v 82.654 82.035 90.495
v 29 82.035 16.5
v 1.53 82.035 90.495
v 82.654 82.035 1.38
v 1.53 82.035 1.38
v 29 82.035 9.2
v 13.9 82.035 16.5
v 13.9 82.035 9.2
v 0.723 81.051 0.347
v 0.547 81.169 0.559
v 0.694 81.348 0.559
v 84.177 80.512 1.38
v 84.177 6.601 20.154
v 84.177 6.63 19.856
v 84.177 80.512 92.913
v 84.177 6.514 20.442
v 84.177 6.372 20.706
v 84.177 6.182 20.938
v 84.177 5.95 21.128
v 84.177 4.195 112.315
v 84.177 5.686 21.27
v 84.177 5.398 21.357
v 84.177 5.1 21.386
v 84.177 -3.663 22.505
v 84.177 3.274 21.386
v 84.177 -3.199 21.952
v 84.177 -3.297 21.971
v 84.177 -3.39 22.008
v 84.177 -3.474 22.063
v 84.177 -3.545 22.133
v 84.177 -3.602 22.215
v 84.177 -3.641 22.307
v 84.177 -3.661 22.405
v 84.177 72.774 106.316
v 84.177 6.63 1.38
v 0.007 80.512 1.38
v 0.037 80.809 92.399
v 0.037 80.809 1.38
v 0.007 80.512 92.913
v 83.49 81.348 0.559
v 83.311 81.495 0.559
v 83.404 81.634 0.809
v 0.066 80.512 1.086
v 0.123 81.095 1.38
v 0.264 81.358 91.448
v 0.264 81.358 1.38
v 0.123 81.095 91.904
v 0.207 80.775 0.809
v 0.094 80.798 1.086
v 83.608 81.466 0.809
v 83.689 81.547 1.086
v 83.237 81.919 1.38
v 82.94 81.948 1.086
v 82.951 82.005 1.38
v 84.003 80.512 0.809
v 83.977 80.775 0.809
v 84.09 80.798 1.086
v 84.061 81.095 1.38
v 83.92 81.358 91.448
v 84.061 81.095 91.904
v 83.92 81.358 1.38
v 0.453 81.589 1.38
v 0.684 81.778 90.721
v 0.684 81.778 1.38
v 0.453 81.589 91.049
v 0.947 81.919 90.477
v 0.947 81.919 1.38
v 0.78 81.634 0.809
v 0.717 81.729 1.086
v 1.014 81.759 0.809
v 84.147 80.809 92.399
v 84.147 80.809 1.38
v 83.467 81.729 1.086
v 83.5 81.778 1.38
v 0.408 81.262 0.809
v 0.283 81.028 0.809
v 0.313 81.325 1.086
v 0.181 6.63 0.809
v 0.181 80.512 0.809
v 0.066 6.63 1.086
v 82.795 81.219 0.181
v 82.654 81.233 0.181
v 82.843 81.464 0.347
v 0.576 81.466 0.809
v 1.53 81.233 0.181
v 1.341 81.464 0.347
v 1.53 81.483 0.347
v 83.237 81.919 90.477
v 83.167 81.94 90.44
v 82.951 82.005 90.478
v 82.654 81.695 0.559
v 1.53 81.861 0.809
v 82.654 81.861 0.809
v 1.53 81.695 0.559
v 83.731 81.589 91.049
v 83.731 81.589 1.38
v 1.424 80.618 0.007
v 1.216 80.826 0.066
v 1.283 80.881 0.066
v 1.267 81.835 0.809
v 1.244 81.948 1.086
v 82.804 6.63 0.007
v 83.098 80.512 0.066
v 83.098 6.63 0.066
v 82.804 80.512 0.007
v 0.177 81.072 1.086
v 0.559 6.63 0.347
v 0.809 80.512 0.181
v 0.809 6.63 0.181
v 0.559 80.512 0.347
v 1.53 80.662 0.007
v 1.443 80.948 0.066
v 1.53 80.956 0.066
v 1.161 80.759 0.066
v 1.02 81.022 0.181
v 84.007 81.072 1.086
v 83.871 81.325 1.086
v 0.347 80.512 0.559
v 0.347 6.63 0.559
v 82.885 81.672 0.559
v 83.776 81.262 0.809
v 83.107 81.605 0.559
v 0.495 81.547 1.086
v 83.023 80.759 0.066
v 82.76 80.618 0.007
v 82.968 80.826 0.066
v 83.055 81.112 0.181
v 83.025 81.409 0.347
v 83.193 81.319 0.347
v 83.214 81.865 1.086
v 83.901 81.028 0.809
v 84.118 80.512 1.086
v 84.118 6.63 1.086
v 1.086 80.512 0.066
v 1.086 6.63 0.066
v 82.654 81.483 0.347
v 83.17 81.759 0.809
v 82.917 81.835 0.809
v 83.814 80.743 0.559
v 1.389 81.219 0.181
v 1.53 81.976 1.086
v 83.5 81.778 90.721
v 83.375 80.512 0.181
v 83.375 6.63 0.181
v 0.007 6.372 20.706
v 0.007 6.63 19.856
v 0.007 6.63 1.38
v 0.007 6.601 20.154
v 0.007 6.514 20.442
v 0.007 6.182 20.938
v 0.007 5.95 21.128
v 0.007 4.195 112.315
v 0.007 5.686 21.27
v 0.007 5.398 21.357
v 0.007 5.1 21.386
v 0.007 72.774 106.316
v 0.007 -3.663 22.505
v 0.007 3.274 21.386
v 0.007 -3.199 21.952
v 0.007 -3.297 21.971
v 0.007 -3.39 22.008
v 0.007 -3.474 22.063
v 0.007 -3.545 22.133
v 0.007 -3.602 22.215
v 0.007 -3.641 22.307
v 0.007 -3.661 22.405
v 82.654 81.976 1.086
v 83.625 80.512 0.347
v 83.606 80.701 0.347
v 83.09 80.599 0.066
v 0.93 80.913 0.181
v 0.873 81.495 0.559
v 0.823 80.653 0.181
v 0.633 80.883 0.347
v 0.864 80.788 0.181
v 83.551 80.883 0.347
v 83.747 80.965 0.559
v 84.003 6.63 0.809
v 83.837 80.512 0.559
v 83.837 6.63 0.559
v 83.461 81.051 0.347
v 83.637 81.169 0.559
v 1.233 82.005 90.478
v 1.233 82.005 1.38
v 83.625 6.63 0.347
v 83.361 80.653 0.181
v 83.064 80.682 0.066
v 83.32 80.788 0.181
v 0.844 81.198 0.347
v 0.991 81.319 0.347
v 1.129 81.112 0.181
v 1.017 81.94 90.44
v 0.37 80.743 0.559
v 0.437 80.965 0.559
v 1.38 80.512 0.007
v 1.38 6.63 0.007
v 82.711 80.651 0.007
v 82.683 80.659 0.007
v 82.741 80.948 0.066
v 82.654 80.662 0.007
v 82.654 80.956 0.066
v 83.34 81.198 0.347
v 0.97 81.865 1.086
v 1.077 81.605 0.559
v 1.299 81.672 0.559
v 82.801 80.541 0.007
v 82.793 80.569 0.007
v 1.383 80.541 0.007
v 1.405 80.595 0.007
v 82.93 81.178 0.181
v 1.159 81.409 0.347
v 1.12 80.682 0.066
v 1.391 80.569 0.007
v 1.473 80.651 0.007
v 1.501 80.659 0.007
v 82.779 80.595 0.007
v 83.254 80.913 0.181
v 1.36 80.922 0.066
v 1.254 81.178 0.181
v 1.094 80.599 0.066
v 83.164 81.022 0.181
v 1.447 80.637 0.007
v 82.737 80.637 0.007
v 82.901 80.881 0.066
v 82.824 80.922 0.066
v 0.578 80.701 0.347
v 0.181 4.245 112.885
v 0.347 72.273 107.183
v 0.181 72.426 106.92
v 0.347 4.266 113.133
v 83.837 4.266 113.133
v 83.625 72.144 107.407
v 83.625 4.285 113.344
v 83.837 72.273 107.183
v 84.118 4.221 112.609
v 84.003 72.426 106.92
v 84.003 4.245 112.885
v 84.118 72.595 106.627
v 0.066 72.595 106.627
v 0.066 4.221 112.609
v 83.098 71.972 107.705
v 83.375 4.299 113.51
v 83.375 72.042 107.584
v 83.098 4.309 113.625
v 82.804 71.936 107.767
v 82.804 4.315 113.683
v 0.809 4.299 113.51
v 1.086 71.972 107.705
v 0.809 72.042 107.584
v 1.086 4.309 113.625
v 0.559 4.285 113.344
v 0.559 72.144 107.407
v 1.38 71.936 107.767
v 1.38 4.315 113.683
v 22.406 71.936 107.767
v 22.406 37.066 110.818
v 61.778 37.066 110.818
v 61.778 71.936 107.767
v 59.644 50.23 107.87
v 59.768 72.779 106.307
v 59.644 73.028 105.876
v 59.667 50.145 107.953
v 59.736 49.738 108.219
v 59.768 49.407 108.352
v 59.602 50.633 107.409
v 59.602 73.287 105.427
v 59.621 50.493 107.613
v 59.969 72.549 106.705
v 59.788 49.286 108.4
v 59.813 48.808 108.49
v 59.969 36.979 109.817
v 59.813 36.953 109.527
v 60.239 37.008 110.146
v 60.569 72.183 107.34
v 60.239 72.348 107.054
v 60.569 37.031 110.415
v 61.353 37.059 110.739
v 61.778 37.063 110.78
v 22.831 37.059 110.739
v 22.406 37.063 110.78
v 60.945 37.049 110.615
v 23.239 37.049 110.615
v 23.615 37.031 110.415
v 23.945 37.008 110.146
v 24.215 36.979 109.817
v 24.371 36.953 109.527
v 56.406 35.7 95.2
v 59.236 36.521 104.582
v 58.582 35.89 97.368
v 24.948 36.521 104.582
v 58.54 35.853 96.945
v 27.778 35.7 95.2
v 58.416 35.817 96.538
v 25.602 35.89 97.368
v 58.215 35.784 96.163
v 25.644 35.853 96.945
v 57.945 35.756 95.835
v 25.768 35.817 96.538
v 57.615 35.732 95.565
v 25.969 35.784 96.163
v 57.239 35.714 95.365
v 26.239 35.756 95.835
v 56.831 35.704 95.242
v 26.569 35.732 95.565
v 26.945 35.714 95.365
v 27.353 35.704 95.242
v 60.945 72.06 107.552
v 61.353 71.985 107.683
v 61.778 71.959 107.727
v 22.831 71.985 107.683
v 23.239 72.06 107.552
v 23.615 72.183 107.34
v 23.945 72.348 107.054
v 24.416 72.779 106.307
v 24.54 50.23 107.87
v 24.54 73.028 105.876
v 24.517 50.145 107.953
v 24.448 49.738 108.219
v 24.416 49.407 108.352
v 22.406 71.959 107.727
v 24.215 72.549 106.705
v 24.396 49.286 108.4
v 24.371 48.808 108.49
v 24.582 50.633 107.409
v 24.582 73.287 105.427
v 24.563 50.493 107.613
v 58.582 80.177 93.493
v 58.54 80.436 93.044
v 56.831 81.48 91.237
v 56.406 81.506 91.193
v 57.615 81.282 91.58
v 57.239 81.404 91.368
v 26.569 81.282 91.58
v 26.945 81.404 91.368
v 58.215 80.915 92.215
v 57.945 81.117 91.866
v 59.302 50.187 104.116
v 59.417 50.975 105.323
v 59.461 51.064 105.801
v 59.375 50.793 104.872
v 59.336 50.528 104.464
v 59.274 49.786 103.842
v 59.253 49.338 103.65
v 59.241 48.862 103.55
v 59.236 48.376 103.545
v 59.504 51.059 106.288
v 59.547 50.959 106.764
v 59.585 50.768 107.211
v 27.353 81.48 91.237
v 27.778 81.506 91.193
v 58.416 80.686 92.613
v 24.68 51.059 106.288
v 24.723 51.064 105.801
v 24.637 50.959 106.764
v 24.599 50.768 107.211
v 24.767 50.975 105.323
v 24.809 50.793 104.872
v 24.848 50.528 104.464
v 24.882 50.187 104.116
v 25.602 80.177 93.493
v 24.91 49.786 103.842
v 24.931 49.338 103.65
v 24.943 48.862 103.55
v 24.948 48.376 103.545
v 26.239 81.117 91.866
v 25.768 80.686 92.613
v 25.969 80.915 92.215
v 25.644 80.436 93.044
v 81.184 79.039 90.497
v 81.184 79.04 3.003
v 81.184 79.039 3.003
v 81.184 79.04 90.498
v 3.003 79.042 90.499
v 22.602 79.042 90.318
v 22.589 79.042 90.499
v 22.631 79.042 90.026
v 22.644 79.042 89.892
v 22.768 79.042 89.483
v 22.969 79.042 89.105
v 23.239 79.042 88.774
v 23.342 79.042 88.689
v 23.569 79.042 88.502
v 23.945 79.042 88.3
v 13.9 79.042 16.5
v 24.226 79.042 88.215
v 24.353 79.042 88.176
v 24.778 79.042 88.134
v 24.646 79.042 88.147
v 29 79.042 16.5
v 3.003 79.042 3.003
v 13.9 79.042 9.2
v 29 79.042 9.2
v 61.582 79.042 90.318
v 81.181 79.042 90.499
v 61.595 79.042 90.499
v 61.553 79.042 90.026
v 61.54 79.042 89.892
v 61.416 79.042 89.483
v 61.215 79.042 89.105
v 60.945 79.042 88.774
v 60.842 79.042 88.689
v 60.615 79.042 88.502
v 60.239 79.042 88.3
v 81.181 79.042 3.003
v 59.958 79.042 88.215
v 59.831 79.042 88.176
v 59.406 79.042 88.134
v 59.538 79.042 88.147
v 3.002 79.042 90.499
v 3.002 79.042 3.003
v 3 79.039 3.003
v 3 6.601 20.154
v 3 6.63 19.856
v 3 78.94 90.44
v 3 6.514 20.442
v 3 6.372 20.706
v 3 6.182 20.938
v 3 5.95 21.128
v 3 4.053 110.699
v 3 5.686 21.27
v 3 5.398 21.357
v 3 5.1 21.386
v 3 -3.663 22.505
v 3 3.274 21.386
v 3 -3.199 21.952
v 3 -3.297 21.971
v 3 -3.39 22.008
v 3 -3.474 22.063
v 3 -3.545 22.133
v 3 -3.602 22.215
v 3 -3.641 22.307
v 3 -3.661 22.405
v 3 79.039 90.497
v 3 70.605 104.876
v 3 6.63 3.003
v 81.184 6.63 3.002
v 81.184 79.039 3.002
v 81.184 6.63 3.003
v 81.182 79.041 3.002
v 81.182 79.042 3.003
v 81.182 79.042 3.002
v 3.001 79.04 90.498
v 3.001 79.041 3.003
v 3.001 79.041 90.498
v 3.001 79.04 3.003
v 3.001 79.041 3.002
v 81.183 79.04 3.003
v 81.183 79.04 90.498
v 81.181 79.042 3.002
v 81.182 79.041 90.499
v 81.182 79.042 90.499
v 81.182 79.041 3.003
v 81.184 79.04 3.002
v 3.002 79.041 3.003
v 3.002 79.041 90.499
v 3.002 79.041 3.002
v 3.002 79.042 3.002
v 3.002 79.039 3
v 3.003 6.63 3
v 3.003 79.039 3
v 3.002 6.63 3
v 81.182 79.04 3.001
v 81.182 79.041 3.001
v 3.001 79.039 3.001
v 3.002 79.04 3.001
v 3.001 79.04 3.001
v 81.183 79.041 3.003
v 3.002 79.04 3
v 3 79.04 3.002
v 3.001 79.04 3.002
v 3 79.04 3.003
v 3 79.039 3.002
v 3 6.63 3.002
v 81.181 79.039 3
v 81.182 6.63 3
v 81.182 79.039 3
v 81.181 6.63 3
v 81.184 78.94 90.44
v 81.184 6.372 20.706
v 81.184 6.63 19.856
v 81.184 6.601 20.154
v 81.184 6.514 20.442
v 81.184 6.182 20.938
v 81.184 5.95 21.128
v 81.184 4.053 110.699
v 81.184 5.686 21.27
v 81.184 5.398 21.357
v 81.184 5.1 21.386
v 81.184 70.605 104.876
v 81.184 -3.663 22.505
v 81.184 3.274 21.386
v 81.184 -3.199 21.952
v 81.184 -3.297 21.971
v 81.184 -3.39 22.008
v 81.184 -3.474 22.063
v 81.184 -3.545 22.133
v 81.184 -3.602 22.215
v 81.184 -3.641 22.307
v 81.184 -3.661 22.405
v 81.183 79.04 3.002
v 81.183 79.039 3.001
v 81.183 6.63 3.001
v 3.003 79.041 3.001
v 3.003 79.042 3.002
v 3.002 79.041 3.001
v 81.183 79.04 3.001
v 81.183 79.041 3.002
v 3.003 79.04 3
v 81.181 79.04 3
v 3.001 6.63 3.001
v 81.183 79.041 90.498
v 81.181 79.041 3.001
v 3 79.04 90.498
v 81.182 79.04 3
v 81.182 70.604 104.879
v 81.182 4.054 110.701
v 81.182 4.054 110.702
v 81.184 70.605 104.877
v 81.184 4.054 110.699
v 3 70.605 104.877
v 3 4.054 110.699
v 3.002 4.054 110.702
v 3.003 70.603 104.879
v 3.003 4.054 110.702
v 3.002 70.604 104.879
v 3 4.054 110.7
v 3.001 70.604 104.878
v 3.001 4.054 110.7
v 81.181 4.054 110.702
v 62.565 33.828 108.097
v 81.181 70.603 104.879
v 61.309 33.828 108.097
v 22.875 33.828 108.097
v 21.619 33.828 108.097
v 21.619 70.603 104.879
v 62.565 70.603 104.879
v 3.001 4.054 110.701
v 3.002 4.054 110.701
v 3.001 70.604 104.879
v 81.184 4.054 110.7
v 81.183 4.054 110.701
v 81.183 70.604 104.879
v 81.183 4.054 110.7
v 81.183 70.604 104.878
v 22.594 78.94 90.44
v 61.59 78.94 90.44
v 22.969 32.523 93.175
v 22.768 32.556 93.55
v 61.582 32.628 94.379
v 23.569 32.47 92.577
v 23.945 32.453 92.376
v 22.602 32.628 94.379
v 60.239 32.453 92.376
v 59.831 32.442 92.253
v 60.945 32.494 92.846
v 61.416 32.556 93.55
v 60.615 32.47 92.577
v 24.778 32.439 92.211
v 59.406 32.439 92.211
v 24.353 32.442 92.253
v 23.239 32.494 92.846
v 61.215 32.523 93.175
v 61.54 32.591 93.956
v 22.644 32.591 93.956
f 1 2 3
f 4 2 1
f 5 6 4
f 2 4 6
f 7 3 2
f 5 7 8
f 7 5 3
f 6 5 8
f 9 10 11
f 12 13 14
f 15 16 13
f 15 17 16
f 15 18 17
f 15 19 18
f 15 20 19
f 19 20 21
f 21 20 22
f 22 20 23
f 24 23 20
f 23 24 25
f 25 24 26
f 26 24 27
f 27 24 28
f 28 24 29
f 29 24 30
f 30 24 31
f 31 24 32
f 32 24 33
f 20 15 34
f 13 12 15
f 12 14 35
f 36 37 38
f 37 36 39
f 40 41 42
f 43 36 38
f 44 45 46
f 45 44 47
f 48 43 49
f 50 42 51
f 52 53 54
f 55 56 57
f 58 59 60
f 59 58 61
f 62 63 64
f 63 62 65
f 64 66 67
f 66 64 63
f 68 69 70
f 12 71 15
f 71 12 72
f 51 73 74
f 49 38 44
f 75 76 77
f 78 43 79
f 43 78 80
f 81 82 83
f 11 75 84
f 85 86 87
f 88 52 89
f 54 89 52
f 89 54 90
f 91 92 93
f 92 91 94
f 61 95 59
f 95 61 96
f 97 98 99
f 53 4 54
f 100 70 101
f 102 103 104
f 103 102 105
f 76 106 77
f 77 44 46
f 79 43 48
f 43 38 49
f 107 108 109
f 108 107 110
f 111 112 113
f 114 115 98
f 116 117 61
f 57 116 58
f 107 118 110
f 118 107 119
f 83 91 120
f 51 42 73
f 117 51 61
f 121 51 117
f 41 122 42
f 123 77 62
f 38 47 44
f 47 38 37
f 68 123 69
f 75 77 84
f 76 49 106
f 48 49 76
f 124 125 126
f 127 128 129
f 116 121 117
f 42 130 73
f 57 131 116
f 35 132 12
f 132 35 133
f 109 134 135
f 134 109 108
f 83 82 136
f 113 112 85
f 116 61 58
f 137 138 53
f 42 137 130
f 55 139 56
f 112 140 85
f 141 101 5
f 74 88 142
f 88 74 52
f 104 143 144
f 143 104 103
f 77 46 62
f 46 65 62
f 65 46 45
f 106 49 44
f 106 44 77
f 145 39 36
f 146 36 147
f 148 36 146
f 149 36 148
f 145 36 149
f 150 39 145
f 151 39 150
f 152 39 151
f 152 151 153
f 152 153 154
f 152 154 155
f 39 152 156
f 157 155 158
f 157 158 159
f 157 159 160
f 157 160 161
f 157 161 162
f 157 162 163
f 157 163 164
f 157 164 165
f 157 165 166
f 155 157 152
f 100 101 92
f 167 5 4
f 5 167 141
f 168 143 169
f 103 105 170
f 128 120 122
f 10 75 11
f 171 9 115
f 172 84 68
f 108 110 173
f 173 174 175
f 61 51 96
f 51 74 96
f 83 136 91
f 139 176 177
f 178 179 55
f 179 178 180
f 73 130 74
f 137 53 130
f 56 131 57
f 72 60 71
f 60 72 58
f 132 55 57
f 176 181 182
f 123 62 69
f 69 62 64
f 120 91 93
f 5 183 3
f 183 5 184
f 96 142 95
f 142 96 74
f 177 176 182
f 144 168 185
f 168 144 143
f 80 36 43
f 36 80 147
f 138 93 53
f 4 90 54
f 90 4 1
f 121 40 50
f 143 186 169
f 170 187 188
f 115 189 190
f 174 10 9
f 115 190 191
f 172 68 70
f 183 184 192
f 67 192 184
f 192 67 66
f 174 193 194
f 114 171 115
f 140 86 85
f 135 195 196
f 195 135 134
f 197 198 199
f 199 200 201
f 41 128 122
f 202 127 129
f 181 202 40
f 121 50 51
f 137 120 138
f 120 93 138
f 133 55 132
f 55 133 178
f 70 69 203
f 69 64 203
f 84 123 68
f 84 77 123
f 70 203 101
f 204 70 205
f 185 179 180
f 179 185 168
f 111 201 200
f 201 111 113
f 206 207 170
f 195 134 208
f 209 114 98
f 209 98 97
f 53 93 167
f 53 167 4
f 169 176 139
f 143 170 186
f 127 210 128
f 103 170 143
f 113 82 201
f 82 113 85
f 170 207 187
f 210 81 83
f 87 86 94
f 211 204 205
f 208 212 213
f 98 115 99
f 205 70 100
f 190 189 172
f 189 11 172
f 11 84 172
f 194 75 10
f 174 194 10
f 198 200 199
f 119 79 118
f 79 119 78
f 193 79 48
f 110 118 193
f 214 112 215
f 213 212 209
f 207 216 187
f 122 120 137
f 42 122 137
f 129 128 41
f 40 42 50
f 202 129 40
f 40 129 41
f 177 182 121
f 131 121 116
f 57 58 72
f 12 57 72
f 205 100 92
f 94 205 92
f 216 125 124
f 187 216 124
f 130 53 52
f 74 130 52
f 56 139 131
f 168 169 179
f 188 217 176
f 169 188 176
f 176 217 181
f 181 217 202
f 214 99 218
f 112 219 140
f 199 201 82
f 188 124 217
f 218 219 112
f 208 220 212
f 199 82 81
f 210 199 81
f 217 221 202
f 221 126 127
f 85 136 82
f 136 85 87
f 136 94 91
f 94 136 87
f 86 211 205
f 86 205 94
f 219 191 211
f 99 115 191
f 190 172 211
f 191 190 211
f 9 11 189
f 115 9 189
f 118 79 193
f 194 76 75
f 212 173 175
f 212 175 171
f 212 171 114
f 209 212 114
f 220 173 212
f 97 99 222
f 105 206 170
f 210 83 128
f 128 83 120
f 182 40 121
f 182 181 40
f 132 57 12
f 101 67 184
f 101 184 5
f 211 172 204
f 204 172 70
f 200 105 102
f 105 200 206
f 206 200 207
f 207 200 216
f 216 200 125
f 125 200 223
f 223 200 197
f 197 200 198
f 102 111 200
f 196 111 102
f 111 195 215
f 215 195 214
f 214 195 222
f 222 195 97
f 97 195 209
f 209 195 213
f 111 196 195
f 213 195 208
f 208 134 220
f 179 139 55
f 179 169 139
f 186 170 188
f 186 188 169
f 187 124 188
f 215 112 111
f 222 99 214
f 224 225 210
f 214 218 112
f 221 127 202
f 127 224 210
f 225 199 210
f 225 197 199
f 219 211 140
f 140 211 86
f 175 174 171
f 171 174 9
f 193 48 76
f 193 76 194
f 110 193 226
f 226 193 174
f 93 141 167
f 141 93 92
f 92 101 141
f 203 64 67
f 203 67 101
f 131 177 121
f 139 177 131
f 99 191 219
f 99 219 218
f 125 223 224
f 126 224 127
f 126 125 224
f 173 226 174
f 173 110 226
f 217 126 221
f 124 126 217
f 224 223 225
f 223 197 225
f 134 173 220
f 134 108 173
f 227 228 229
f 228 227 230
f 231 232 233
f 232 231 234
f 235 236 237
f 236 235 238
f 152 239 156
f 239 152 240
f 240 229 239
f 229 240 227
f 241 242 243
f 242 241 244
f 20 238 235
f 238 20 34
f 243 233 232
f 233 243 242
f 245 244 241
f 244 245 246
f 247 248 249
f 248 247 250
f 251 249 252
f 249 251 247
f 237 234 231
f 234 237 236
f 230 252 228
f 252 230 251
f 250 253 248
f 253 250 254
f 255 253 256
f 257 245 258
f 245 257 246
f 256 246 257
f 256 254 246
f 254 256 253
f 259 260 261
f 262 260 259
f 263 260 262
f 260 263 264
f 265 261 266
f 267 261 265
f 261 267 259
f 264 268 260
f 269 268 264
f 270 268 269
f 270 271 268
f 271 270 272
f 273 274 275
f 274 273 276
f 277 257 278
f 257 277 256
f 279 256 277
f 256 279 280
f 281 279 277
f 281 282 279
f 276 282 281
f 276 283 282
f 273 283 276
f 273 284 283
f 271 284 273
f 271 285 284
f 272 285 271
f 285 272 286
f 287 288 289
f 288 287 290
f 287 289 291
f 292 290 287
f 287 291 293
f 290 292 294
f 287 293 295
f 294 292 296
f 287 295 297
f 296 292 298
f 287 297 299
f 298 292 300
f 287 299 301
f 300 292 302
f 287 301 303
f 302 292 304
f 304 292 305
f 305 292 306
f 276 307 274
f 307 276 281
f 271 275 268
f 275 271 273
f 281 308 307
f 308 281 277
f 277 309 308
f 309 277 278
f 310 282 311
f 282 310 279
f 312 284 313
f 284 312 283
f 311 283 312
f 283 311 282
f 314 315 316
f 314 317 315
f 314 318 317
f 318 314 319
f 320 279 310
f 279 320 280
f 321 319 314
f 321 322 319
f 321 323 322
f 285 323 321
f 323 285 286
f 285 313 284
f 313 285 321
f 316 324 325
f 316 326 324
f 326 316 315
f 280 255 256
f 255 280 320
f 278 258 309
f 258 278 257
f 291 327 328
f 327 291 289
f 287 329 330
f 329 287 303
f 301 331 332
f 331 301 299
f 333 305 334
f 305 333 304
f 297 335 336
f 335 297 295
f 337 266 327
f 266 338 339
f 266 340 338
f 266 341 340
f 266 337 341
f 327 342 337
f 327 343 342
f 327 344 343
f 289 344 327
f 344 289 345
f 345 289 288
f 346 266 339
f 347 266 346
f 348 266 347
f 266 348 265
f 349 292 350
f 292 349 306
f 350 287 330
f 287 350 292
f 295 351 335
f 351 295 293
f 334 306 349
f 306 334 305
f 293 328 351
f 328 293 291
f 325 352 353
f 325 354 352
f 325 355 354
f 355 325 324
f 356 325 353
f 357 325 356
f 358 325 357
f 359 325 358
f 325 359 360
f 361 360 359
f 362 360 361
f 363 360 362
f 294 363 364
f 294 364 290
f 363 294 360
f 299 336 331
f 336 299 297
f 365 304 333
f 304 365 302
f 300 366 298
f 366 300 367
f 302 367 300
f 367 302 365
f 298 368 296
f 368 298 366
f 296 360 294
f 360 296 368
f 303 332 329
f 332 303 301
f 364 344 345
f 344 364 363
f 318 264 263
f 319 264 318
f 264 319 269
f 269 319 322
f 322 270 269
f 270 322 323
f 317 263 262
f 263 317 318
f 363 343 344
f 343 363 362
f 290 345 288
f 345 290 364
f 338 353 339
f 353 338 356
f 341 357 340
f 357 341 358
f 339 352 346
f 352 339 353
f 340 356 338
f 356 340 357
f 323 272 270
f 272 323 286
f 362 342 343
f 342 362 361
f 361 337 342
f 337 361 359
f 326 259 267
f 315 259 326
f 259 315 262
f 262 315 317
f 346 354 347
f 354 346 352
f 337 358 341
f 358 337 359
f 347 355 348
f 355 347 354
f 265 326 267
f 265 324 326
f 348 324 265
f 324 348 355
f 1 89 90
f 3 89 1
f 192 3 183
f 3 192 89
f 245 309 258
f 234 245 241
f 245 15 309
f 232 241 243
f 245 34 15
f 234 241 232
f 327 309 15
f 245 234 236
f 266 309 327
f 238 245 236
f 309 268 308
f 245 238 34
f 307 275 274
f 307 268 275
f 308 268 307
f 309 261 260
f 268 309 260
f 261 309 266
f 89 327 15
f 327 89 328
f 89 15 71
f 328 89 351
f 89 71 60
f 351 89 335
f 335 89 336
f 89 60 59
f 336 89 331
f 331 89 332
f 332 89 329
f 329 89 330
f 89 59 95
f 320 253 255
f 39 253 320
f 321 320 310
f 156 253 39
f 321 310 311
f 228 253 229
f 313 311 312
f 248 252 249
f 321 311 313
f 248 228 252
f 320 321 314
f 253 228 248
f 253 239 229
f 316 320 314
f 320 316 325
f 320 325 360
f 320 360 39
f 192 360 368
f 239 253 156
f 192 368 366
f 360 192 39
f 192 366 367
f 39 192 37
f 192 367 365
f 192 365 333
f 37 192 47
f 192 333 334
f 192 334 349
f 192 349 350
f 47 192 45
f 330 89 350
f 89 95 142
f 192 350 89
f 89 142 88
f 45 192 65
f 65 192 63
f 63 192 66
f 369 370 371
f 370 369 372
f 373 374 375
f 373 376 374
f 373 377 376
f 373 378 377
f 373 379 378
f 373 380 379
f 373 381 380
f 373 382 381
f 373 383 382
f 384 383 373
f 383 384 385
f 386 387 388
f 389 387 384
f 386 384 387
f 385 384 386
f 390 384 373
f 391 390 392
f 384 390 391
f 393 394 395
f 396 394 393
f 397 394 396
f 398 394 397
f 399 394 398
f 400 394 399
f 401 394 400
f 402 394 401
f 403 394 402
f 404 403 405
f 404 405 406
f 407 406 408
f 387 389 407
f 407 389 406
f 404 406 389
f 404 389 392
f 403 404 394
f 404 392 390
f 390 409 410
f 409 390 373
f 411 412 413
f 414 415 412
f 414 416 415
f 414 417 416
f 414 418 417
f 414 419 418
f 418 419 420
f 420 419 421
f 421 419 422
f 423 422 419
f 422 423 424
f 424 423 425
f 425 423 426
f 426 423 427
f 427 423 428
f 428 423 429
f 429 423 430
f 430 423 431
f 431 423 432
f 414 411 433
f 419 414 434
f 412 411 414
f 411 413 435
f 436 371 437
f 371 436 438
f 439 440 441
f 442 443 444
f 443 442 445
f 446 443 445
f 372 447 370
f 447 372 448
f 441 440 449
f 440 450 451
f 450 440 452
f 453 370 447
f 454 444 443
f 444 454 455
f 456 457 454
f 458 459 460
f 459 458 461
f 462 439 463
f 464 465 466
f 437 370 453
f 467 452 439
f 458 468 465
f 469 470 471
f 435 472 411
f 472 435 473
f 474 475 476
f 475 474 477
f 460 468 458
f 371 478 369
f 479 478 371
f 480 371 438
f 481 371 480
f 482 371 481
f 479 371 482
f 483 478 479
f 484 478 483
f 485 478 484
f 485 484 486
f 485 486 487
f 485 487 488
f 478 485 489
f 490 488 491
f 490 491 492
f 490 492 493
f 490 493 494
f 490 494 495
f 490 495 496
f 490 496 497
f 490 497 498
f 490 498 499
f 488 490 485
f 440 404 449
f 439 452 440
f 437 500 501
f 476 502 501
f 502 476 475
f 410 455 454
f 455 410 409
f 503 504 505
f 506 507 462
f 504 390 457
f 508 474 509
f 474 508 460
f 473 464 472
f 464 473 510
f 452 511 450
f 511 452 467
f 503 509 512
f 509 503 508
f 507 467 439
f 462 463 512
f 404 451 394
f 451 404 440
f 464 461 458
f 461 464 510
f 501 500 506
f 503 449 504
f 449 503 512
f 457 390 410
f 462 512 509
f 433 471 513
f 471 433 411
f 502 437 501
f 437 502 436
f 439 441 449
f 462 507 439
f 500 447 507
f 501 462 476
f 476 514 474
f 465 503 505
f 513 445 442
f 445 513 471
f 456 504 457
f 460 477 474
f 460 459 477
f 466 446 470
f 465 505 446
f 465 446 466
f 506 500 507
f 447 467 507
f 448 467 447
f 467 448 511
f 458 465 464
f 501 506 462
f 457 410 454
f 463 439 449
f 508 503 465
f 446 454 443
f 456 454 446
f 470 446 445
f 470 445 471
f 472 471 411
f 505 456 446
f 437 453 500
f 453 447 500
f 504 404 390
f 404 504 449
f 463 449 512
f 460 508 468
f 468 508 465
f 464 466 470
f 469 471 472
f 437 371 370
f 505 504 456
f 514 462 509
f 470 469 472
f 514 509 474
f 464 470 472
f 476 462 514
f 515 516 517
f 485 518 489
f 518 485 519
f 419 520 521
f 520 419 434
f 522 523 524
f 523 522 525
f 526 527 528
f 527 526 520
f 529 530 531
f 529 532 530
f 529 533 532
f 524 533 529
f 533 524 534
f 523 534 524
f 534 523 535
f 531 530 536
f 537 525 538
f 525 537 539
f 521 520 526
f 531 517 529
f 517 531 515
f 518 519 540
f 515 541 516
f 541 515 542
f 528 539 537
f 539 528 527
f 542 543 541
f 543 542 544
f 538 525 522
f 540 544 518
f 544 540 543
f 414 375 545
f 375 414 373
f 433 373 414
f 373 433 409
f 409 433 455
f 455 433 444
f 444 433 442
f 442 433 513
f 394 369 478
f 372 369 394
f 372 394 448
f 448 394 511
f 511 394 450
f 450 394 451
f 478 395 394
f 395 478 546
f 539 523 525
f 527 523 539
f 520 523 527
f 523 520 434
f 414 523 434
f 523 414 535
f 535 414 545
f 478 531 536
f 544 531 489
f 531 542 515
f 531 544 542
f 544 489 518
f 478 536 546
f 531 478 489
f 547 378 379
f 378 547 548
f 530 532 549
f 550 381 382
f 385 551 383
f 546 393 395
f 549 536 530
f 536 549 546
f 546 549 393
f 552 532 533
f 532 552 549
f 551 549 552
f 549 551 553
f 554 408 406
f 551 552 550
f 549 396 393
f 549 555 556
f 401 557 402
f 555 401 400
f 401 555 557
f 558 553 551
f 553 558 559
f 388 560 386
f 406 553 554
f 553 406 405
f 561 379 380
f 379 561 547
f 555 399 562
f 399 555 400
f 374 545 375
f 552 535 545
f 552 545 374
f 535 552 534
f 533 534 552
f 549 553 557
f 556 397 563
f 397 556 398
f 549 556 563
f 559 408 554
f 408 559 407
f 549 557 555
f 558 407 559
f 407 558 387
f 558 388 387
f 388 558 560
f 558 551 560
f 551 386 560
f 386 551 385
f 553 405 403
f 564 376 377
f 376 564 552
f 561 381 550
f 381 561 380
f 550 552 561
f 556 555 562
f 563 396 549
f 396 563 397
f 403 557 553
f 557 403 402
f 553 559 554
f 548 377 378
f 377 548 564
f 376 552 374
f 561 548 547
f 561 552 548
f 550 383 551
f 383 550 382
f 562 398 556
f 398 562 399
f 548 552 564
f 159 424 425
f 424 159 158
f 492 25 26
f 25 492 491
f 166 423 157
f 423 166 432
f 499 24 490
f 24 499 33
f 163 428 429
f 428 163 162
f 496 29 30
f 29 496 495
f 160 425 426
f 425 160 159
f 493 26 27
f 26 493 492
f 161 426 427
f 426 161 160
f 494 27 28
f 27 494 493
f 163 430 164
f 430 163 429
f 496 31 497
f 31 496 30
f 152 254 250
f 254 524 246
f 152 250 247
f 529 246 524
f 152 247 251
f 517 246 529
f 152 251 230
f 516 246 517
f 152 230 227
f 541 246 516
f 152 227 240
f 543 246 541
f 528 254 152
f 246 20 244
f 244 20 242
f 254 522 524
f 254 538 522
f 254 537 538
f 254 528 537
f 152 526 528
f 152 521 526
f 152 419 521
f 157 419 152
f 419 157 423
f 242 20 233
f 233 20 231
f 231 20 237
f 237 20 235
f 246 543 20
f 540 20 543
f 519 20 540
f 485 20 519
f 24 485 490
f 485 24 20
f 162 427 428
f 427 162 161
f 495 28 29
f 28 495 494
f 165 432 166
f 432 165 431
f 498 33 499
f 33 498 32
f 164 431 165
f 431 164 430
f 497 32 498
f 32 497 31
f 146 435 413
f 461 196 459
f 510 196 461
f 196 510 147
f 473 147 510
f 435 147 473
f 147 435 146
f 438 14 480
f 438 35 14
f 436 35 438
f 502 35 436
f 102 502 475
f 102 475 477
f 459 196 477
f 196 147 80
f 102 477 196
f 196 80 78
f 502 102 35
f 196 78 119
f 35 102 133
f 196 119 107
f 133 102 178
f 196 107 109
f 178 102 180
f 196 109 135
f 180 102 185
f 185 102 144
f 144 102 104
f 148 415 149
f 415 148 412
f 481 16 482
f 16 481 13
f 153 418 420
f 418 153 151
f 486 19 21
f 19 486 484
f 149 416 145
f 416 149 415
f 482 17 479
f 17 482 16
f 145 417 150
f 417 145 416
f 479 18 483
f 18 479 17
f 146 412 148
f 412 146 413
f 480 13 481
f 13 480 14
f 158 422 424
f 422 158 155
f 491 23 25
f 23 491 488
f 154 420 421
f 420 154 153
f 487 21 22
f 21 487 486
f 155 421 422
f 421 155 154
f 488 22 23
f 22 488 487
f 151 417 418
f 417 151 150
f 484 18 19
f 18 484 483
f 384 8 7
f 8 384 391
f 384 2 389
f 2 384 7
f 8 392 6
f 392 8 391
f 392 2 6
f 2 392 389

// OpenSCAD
/*
 * ----------------------------------------------------------------------------
 * "THE BEER-WARE LICENSE" (Revision 42):
 * Jeroen Domburg <jeroen@spritesmods.com> wrote this file. As long as you retain 
 * this notice you can do whatever you want with this stuff. If we meet some day, 
 * and you think this stuff is worth it, you can buy me a beer in return. 
 * ----------------------------------------------------------------------------
 */

//All measurements in mm

$fa=8; //segments/360 degrees
$fs=0.1; //min size of fragment
$fn=32; //override amount of facets


scale=102/300; //1-to-6

wall=3; //real mms

overlap=5; //real mms; overlap between halves 
overlapth=1.5; //real mms: thickness of material in overlap

//1 - cutout
//2 - full render
//3 - intersection case - pcb
//4 - front half / back half
//5 - front half / back half side-by-side
//6 - back
//7 - front
type=6;

// waveshare display
/*translate([4, 5, 52])
difference() {
    cube([71.5, 11.1, 53]);
    translate([8.65, 0, 4.65])
        cube([58, 11.1, 43.6]); 
}*/

if (type==1) {
    difference() {
        union() {
            mac_half_front(wall, scale, overlap, overlapth);
            translate([0,1,0]) mac_half_back(wall, scale, overlap, overlapth);
        }
        translate([125*scale, -500, -500]) cube([1000, 1000, 1000], false);
    }
    displaypcb(wall, scale);
    translate([0,1,0]) usbserpcb_mounted(wall);
} else if (type==2) {
    union() {
        mac_half_front(wall, scale, overlap, overlapth);
        mac_half_back(wall, scale, overlap, overlapth);
    }
    displaypcb(wall, scale);
    usbserpcb_mounted(wall);
} else if (type==3) {
    intersection() {
        union() {
            mac_half_front(wall, scale, overlap, overlapth);
            mac_half_back(wall, scale, overlap, overlapth);
        }
        displaypcb(wall, scale);
    }
} else if (type==4 || type==5) {
    translate([0, 10, 0]) union() {
        mac_half_back(wall, scale, overlap, overlapth);
        usbserpcb_mounted(wall);
    }
    rotate([0,0,type==5?180:0]) union () {
        mac_half_front(wall, scale, overlap, overlapth);
        *color("red") displaypcb(wall, scale);
    }
} else if (type==6) {
    mac_half_back(wall, scale, overlap, overlapth);
} else if (type==7) {
    mac_half_front(wall, scale, overlap, overlapth);
}


module mac_half_front(wall, scale, overlap, overlapth) {
    difference() {
    union() {
        scale(scale) union() {
            difference() {
                mac_hull(wall/scale);
                mac_crack_divider();
            }
            intersection() {
                mac_overlap_inner_edge(overlapth/scale);
                difference() {
                    //mac_crack_divider_expanded(-0.8/scale);
                    //mac_crack_divider_expanded(overlap/scale);
                }
            }
        }
        difference() {
            union() {
                //bottom screen tab
                //translate([17+wall, -1, 8]) rotate([-20, 0, 0]) cube([10, 2, 3]);
                //top tab
                //translate([14.5+wall, 1, 50]) cube([4, 5, 3]);
            }
            displaypcb(wall, scale);
            
            
        } 
        
       
    }
    
    
    // apple logo
            translate([10, -7.5, 39])
                rotate([85, 0, 0])   
                    scale([0.02, 0.02 , 1])
                        linear_extrude(1.0) 
                            import("applelogo.svg"); 
   }
}


module mac_half_back(wall, scale, overlap, overlapth) {
    union() {
    difference() {
        union() {
            scale(scale) difference() {
                intersection() {
                    mac_hull(wall/scale);
                    mac_crack_divider();
                }
                intersection() {
                    mac_overlap_inner_edge(overlapth/scale);
                    difference() {
                        //mac_crack_divider();
                        //mac_crack_divider_expanded(overlap/scale);
                    }
                }
            }
            //front tab for usb-ser conv
            //translate([wall, 37.7-26-2, 0]) cube([16, 2, wall+1.7]);
            //back tabs for usb-ser conv
            //translate([0, 37-5, wall+1.9]) cube([16+wall, 7, 3]); 
        }
        scale([2, 1, 2])
            usb_hole(wall);
        //mouse_hole(wall);
        //usbserpcb_mounted(wall);        
    }
    //Enable for signatures in backplate
    //Disabled because 3d-printer doesn't really show these...
    //translate([wall, 38.2, 8+wall]) rotate([90, 0, 0]) scale(.2) linear_extrude(height = 3.3) import(file = "signatures.dxf");

    }
}

module usb_hole(wall) {
    w=3; //extra width for bevel
    i=0.2; //inset of bevel
    translate([16+wall,37.7,wall])  rotate([0,0,180]) union() {
        translate([4.5, -100, 1.6]) cube([7.55, 100 , 3.65]);
        translate([4.5-w/2, -wall+i-10, 1.6-w/2]) cube([7.55+w, 10 , 3.65+w]);
    }
}

module mouse_hole(wall) {
    translate([26+wall, 37.7, wall+3.2]) rotate([-90, 0, 0]) cylinder(d=2, 50);
}

module usbserpcb_mounted(wall) {
    translate([16+wall,37.7,wall]) rotate([0,0,180]) usbserpcb();
}

module usbserpcb() {
    cube([16, 26, 1.6]);
    translate([4.5, 0, 1.6]) cube([7.55, 9 , 3.65]);
}



//generates square hull you can cut the inner overlap out of
module mac_overlap_inner_edge(overlapth, isInner) {
    difference() {
        translate([overlapth, -200, overlapth]) cube([247.6-overlapth*2,500,334-overlapth*2]);
        translate([overlapth*2, -200, overlapth*2]) cube([247.6-overlapth*4,500,334-overlapth*4]);
    }
    
}


module mac_hull(wall) {
    difference() {
        mac_hull_solid(0);
        union() {
            mac_hull_solid(wall);
             translate([0, -25.4, 44.5]) rotate([-5,0, 0]) union() {            //Cutout the screen in the back of the frontplate as well
                translate([247.6/2, 0, 185]) rotate([90, 0, 0]) scale(1.55) mac_screen_cutout(wall/1.69);
                //Cutout fdd slot
                translate([129, -5.2, 62.8]) rotate([90,0,0]) fdd_cutout();
             }
        }
    }
}




module displaypcb(wall, scale) {
    translate([wall+.6,-1.6,60*scale]) rotate([90-5,180,180]) translate([0, -42, wall-2.05]) union() {
        cube([35,42, 0.8]); //main pcb
        translate([1, 6.8, 0]) cube([16, 24, 3.6+0.8]); //wroom block
        translate([1.6, 0.4, -1.2]) difference() { //screen
            cube([32.2, 36.75, 1.2]);
            translate([1.5, 2.73, -10+0.7]) cube([28.9, 19.5, 10]);
        }
    }
}



module mac_hull_solid(shrink) {
    rnd=4.5; //rounding of outer case
    //ir=0.8; //rounding of outmost screen bezel
    //a=-6.18; //angle of front
    r=(rnd<shrink)?0.01:rnd-shrink;
    difference() {
        union() {
            difference() {
                //Cube that makes up bottom and back of mac
                translate([shrink, shrink, shrink]) roundedcube(247.6-shrink*2, 241.3-shrink*2, 310-shrink*2, r);
                //cut off bit that sticks through front panel           
                translate([-500, -1000+150, 150]) cube([1000, 1000, 1000]);
            }
            //add in rotated front bulk
            translate([0, -25.4, 44.5]) rotate([-5,0, 0]) mac_front_bulk(4.5, 2, shrink);
        }
        union() {
            //Cut off diagonal bit in top-back of case
            translate([-1, 241-shrink, 266]) rotate([30, 0, 0]) cube([300, 300, 300], false);
            //Handle handle
            translate([247.6/2,105-shrink,280]) rotate([90+5,0,180]) mac_handle_hole(shrink);
        }
    }
}

module mac_front_bulk(or, ir, shrink) {
    fp_th=5.2; //thickness of front plate)
    fp_extra=(shrink<fp_th)?0:shrink-fp_th;
    or=(or<shrink)?0.01:or-shrink;
    ir=(ir<shrink)?0.01:ir-shrink;
    difference() {
        union() {
            difference() {
                translate([0+shrink, -20+shrink, 0+shrink]) roundedcube(247.6-shrink*2, 233.9+20-shrink*2, 292.1-shrink*2, or);
                union() {
                    //Cut off front where faceplate goes
                    translate([-500, -1000+fp_extra, -500]) cube([1000, 1000, 1000]);
                }
            }
            if (shrink==0) {
                mac_front_faceplate(or, ir);
            } else {
                translate([247.6/2, 50, 185])  rotate([90,0,0])scale([1.69, 1.69, 100]) scale(0.95) mac_screen_cutout_back();
                
            }
        }
    }
}



//negative: handle hole (as in: hole for the handle to carry the mac)
//needs to be bigger when shrink increases
module mac_handle_hole(shrink) {
    r=6.4;
    difference() {
        union() {
            hull() {
                translate([-97/2+r-shrink, r-shrink ,0]) cylinder(r=r, 200);
                translate([97/2-r+shrink, r-shrink ,0]) cylinder(r=r, 200);
                translate([-103/2+r-shrink, 46-r ,0]) cylinder(r=r, 200);
                translate([103/2-r+shrink, 46-r ,0]) cylinder(r=r, 200);
            }
            if (shrink==0) {
                difference() {
                    translate([-103/2-r, 46-r, 0]) cube([103+2*r, 200, 200]);
                    union() {
                        translate([-103/2-r, 46-r ,0]) cylinder(r=r, 200);
                        translate([103/2+r, 46-r ,0]) cylinder(r=r, 2200);                
                    }
                }
            }
        }
        if (shrink==0) {
            //thing where you hold the mac
            translate([-100, 35, 0]) rotate([90,0,90]) hull() {
                cylinder(d=14.6, 200);
                translate([0, 35, 0]) cylinder(d=14.6, 200);            
            }
        }
    }
}

//crack divider, but moved up/right to get the overlap edge
module mac_crack_divider_expanded(ex) {
    translate([0,ex,ex]) mac_crack_divider();
}

module mac_crack_divider() {
    difference() {
        rotate([-5, 0, 0]) translate([0, -15, 65]) union() {
            hull () {
                translate([0,0,0]) rotate([0,90,0]) cylinder(r=1.5, 1000);
                translate([0,0,1000]) rotate([0,90,0]) cylinder(r=1.5, 1000);
                translate([0,1000,0]) rotate([0,90,0]) cylinder(r=1.5, 1000);
            }
            translate([-500,20,-500]) cube([1000,1000,1000]);            
        }
        translate([0, 15, 0]) hull() {
            translate([-500, 0, -200]) rotate([0,90,0]) cylinder(r=4.5, 1000);
            translate([-500, 0, 58.4]) rotate([0,90,0]) cylinder(r=4.5, 1000);            
            translate([-500, -200, 58.4]) rotate([0,90,0]) cylinder(r=4.5, 1000);            
        }
    }
}


module mac_front_faceplate() {
    mac_front_faceplate_outer(4.5, 2);
}

module mac_front_faceplate_outer(or, ir) {
    hull() {
        //connection to bulk of case
        translate([0+or, 0, 0+or]) rotate([90,0,0]) cylinder(1, or);
        translate([0+or, 0, 292.1-or]) rotate([90,0,0]) cylinder(1, or);
        translate([247.6-or, 0, 0+or]) rotate([90,0,0]) cylinder(1, or);
        translate([247.6-or, 0, 292.1-or]) rotate([90,0,0]) cylinder(1, or);
        //face of mac
        translate([0+3.4+ir, 1-5.2, 0+8+ir]) rotate([90,0,0]) cylinder(1, ir);
        translate([0+3.4+ir, 1-5.2, 292.1-10-ir]) rotate([90,0,0]) cylinder(1, ir);
        translate([247.6-3.4-ir, 1-5.2, 0+8+ir]) rotate([90,0,0]) cylinder(1, ir);
        translate([247.6-3.4-ir, 1-5.2, 292.1-10-ir]) rotate([90,0,0]) cylinder(1, ir);
    }
}


//WARNING: Everything inhere is adjusted using the wrong scale because I didn't pay attention. I'm too lazy to fix it all up, so if you use it scale(1.69) it first.
module mac_screen_cutout(depth) {
    
    or=2.5;
    ow=123-or*2;
    oh=94-or*2;
    
    hull() {
        //back cutout; fakes CRT curves
        translate([0,0,2.5-depth]) mac_screen_cutout_back();
        //very front of bezel
        translate([ow/2, oh/2, 5.2-1]) cylinder(1, r=or);
        translate([ow/2, -oh/2, 5.2-1]) cylinder(1, r=or);
        translate([-ow/2, oh/2, 5.2-1]) cylinder(1, r=or);
        translate([-ow/2, -oh/2, 5.2-1]) cylinder(1, r=or);
    }
}

//Same scale(1.69) is required here.
module mac_screen_cutout_back() {
    intersection() {
        intersection() {
            union() {
                translate([0, 23-(46-42), 0]) scale([246, 46, 1]) cylinder(10, d=1);
                translate([0, -23+(46-42), 0]) scale([246, 46, 1]) cylinder(10, d=1);
            }
            union() {
                translate([-56/2, 0, 0]) scale([56, 300, 1]) cylinder(1, d=1);
                translate([0, 0, 0]) scale([56, 300, 1]) cylinder(1, d=1);
                translate([56/2, 0, 0]) scale([56, 300, 1]) cylinder(1, d=1);
                
            }
        }
        
        union() {
            dr=6.2;
            w=111-dr*2;
            h=82-dr*2;
            translate([w/2, h/2, 0]) cylinder(10, r=6.2);
            translate([w/2, -h/2, 0]) cylinder(10, r=6.2);
            translate([-w/2, h/2, 0]) cylinder(10, r=6.2);
            translate([-w/2, -h/2, 0]) cylinder(10, r=6.2);
            translate([-w/2, -500, 0]) cube([w, 1000, 10]);
            translate([-500, -h/2, 0]) cube([1000, h, 10]);
        }
    }
}


//Negative space of FDD.
module fdd_cutout() {
        union() {
            fdd_cutout_inner_slot();
            fdd_cutout_inner_right();
            translate([0,0,0]) fdd_cutout_bezel();
            //fdd force eject button
            //translate([98, -5,-50]) cylinder(100, r=1);
        }
}


module fdd_cutout_bezel() {
    thickness=1;
    union() {
        hull() {
            translate([0,0,5-thickness]) fdd_cutout_inner_slot();
            translate([-10.4, -11.5/2, 0]) flatroundedcube(112.3, 11.5, 10, 1);
        }
        hull() {
            translate([0,0,5-thickness]) fdd_cutout_inner_right();
            translate([57.7,-24/2 , 0]) flatroundedcube(44.5, 24, 10, 1);
        }
    }
}


module fdd_cutout_inner_slot() {
    translate([0, -2.6, -5]) cube([93.4, 5.2, 10]);
}

module fdd_cutout_inner_right() {
    translate([65.7, -8.9, -5]) flatroundedcube(27.7, 17.8, 10, 2.1); 
}

//Cube with 4 edges rounded; front/back are flat
module flatroundedcube(x,y,z,r) {
    hull(){
        translate([0+r, 0+r, 0]) cylinder(z, r=r);
        translate([0+r, y-r, 0]) cylinder(z, r=r);
        translate([x-r, 0+r, 0]) cylinder(z, r=r);
        translate([x-r, y-r, 0]) cylinder(z, r=r);
    }
}


//Cube with all edges rounded
module roundedcube(x, y, z, r) {
    if(0) {
        cube([x,y,z], false);
    } else {
        hull() {
            translate([0+r,0+r,0+r]) sphere(r);
            translate([x-r,0+r,0+r]) sphere(r);
            translate([0+r,y-r,0+r]) sphere(r);
            translate([x-r,y-r,0+r]) sphere(r);
            translate([0+r,0+r,z-r]) sphere(r);
            translate([x-r,0+r,z-r]) sphere(r);
            translate([0+r,y-r,z-r]) sphere(r);
            translate([x-r,y-r,z-r]) sphere(r);
        }
    }
}
